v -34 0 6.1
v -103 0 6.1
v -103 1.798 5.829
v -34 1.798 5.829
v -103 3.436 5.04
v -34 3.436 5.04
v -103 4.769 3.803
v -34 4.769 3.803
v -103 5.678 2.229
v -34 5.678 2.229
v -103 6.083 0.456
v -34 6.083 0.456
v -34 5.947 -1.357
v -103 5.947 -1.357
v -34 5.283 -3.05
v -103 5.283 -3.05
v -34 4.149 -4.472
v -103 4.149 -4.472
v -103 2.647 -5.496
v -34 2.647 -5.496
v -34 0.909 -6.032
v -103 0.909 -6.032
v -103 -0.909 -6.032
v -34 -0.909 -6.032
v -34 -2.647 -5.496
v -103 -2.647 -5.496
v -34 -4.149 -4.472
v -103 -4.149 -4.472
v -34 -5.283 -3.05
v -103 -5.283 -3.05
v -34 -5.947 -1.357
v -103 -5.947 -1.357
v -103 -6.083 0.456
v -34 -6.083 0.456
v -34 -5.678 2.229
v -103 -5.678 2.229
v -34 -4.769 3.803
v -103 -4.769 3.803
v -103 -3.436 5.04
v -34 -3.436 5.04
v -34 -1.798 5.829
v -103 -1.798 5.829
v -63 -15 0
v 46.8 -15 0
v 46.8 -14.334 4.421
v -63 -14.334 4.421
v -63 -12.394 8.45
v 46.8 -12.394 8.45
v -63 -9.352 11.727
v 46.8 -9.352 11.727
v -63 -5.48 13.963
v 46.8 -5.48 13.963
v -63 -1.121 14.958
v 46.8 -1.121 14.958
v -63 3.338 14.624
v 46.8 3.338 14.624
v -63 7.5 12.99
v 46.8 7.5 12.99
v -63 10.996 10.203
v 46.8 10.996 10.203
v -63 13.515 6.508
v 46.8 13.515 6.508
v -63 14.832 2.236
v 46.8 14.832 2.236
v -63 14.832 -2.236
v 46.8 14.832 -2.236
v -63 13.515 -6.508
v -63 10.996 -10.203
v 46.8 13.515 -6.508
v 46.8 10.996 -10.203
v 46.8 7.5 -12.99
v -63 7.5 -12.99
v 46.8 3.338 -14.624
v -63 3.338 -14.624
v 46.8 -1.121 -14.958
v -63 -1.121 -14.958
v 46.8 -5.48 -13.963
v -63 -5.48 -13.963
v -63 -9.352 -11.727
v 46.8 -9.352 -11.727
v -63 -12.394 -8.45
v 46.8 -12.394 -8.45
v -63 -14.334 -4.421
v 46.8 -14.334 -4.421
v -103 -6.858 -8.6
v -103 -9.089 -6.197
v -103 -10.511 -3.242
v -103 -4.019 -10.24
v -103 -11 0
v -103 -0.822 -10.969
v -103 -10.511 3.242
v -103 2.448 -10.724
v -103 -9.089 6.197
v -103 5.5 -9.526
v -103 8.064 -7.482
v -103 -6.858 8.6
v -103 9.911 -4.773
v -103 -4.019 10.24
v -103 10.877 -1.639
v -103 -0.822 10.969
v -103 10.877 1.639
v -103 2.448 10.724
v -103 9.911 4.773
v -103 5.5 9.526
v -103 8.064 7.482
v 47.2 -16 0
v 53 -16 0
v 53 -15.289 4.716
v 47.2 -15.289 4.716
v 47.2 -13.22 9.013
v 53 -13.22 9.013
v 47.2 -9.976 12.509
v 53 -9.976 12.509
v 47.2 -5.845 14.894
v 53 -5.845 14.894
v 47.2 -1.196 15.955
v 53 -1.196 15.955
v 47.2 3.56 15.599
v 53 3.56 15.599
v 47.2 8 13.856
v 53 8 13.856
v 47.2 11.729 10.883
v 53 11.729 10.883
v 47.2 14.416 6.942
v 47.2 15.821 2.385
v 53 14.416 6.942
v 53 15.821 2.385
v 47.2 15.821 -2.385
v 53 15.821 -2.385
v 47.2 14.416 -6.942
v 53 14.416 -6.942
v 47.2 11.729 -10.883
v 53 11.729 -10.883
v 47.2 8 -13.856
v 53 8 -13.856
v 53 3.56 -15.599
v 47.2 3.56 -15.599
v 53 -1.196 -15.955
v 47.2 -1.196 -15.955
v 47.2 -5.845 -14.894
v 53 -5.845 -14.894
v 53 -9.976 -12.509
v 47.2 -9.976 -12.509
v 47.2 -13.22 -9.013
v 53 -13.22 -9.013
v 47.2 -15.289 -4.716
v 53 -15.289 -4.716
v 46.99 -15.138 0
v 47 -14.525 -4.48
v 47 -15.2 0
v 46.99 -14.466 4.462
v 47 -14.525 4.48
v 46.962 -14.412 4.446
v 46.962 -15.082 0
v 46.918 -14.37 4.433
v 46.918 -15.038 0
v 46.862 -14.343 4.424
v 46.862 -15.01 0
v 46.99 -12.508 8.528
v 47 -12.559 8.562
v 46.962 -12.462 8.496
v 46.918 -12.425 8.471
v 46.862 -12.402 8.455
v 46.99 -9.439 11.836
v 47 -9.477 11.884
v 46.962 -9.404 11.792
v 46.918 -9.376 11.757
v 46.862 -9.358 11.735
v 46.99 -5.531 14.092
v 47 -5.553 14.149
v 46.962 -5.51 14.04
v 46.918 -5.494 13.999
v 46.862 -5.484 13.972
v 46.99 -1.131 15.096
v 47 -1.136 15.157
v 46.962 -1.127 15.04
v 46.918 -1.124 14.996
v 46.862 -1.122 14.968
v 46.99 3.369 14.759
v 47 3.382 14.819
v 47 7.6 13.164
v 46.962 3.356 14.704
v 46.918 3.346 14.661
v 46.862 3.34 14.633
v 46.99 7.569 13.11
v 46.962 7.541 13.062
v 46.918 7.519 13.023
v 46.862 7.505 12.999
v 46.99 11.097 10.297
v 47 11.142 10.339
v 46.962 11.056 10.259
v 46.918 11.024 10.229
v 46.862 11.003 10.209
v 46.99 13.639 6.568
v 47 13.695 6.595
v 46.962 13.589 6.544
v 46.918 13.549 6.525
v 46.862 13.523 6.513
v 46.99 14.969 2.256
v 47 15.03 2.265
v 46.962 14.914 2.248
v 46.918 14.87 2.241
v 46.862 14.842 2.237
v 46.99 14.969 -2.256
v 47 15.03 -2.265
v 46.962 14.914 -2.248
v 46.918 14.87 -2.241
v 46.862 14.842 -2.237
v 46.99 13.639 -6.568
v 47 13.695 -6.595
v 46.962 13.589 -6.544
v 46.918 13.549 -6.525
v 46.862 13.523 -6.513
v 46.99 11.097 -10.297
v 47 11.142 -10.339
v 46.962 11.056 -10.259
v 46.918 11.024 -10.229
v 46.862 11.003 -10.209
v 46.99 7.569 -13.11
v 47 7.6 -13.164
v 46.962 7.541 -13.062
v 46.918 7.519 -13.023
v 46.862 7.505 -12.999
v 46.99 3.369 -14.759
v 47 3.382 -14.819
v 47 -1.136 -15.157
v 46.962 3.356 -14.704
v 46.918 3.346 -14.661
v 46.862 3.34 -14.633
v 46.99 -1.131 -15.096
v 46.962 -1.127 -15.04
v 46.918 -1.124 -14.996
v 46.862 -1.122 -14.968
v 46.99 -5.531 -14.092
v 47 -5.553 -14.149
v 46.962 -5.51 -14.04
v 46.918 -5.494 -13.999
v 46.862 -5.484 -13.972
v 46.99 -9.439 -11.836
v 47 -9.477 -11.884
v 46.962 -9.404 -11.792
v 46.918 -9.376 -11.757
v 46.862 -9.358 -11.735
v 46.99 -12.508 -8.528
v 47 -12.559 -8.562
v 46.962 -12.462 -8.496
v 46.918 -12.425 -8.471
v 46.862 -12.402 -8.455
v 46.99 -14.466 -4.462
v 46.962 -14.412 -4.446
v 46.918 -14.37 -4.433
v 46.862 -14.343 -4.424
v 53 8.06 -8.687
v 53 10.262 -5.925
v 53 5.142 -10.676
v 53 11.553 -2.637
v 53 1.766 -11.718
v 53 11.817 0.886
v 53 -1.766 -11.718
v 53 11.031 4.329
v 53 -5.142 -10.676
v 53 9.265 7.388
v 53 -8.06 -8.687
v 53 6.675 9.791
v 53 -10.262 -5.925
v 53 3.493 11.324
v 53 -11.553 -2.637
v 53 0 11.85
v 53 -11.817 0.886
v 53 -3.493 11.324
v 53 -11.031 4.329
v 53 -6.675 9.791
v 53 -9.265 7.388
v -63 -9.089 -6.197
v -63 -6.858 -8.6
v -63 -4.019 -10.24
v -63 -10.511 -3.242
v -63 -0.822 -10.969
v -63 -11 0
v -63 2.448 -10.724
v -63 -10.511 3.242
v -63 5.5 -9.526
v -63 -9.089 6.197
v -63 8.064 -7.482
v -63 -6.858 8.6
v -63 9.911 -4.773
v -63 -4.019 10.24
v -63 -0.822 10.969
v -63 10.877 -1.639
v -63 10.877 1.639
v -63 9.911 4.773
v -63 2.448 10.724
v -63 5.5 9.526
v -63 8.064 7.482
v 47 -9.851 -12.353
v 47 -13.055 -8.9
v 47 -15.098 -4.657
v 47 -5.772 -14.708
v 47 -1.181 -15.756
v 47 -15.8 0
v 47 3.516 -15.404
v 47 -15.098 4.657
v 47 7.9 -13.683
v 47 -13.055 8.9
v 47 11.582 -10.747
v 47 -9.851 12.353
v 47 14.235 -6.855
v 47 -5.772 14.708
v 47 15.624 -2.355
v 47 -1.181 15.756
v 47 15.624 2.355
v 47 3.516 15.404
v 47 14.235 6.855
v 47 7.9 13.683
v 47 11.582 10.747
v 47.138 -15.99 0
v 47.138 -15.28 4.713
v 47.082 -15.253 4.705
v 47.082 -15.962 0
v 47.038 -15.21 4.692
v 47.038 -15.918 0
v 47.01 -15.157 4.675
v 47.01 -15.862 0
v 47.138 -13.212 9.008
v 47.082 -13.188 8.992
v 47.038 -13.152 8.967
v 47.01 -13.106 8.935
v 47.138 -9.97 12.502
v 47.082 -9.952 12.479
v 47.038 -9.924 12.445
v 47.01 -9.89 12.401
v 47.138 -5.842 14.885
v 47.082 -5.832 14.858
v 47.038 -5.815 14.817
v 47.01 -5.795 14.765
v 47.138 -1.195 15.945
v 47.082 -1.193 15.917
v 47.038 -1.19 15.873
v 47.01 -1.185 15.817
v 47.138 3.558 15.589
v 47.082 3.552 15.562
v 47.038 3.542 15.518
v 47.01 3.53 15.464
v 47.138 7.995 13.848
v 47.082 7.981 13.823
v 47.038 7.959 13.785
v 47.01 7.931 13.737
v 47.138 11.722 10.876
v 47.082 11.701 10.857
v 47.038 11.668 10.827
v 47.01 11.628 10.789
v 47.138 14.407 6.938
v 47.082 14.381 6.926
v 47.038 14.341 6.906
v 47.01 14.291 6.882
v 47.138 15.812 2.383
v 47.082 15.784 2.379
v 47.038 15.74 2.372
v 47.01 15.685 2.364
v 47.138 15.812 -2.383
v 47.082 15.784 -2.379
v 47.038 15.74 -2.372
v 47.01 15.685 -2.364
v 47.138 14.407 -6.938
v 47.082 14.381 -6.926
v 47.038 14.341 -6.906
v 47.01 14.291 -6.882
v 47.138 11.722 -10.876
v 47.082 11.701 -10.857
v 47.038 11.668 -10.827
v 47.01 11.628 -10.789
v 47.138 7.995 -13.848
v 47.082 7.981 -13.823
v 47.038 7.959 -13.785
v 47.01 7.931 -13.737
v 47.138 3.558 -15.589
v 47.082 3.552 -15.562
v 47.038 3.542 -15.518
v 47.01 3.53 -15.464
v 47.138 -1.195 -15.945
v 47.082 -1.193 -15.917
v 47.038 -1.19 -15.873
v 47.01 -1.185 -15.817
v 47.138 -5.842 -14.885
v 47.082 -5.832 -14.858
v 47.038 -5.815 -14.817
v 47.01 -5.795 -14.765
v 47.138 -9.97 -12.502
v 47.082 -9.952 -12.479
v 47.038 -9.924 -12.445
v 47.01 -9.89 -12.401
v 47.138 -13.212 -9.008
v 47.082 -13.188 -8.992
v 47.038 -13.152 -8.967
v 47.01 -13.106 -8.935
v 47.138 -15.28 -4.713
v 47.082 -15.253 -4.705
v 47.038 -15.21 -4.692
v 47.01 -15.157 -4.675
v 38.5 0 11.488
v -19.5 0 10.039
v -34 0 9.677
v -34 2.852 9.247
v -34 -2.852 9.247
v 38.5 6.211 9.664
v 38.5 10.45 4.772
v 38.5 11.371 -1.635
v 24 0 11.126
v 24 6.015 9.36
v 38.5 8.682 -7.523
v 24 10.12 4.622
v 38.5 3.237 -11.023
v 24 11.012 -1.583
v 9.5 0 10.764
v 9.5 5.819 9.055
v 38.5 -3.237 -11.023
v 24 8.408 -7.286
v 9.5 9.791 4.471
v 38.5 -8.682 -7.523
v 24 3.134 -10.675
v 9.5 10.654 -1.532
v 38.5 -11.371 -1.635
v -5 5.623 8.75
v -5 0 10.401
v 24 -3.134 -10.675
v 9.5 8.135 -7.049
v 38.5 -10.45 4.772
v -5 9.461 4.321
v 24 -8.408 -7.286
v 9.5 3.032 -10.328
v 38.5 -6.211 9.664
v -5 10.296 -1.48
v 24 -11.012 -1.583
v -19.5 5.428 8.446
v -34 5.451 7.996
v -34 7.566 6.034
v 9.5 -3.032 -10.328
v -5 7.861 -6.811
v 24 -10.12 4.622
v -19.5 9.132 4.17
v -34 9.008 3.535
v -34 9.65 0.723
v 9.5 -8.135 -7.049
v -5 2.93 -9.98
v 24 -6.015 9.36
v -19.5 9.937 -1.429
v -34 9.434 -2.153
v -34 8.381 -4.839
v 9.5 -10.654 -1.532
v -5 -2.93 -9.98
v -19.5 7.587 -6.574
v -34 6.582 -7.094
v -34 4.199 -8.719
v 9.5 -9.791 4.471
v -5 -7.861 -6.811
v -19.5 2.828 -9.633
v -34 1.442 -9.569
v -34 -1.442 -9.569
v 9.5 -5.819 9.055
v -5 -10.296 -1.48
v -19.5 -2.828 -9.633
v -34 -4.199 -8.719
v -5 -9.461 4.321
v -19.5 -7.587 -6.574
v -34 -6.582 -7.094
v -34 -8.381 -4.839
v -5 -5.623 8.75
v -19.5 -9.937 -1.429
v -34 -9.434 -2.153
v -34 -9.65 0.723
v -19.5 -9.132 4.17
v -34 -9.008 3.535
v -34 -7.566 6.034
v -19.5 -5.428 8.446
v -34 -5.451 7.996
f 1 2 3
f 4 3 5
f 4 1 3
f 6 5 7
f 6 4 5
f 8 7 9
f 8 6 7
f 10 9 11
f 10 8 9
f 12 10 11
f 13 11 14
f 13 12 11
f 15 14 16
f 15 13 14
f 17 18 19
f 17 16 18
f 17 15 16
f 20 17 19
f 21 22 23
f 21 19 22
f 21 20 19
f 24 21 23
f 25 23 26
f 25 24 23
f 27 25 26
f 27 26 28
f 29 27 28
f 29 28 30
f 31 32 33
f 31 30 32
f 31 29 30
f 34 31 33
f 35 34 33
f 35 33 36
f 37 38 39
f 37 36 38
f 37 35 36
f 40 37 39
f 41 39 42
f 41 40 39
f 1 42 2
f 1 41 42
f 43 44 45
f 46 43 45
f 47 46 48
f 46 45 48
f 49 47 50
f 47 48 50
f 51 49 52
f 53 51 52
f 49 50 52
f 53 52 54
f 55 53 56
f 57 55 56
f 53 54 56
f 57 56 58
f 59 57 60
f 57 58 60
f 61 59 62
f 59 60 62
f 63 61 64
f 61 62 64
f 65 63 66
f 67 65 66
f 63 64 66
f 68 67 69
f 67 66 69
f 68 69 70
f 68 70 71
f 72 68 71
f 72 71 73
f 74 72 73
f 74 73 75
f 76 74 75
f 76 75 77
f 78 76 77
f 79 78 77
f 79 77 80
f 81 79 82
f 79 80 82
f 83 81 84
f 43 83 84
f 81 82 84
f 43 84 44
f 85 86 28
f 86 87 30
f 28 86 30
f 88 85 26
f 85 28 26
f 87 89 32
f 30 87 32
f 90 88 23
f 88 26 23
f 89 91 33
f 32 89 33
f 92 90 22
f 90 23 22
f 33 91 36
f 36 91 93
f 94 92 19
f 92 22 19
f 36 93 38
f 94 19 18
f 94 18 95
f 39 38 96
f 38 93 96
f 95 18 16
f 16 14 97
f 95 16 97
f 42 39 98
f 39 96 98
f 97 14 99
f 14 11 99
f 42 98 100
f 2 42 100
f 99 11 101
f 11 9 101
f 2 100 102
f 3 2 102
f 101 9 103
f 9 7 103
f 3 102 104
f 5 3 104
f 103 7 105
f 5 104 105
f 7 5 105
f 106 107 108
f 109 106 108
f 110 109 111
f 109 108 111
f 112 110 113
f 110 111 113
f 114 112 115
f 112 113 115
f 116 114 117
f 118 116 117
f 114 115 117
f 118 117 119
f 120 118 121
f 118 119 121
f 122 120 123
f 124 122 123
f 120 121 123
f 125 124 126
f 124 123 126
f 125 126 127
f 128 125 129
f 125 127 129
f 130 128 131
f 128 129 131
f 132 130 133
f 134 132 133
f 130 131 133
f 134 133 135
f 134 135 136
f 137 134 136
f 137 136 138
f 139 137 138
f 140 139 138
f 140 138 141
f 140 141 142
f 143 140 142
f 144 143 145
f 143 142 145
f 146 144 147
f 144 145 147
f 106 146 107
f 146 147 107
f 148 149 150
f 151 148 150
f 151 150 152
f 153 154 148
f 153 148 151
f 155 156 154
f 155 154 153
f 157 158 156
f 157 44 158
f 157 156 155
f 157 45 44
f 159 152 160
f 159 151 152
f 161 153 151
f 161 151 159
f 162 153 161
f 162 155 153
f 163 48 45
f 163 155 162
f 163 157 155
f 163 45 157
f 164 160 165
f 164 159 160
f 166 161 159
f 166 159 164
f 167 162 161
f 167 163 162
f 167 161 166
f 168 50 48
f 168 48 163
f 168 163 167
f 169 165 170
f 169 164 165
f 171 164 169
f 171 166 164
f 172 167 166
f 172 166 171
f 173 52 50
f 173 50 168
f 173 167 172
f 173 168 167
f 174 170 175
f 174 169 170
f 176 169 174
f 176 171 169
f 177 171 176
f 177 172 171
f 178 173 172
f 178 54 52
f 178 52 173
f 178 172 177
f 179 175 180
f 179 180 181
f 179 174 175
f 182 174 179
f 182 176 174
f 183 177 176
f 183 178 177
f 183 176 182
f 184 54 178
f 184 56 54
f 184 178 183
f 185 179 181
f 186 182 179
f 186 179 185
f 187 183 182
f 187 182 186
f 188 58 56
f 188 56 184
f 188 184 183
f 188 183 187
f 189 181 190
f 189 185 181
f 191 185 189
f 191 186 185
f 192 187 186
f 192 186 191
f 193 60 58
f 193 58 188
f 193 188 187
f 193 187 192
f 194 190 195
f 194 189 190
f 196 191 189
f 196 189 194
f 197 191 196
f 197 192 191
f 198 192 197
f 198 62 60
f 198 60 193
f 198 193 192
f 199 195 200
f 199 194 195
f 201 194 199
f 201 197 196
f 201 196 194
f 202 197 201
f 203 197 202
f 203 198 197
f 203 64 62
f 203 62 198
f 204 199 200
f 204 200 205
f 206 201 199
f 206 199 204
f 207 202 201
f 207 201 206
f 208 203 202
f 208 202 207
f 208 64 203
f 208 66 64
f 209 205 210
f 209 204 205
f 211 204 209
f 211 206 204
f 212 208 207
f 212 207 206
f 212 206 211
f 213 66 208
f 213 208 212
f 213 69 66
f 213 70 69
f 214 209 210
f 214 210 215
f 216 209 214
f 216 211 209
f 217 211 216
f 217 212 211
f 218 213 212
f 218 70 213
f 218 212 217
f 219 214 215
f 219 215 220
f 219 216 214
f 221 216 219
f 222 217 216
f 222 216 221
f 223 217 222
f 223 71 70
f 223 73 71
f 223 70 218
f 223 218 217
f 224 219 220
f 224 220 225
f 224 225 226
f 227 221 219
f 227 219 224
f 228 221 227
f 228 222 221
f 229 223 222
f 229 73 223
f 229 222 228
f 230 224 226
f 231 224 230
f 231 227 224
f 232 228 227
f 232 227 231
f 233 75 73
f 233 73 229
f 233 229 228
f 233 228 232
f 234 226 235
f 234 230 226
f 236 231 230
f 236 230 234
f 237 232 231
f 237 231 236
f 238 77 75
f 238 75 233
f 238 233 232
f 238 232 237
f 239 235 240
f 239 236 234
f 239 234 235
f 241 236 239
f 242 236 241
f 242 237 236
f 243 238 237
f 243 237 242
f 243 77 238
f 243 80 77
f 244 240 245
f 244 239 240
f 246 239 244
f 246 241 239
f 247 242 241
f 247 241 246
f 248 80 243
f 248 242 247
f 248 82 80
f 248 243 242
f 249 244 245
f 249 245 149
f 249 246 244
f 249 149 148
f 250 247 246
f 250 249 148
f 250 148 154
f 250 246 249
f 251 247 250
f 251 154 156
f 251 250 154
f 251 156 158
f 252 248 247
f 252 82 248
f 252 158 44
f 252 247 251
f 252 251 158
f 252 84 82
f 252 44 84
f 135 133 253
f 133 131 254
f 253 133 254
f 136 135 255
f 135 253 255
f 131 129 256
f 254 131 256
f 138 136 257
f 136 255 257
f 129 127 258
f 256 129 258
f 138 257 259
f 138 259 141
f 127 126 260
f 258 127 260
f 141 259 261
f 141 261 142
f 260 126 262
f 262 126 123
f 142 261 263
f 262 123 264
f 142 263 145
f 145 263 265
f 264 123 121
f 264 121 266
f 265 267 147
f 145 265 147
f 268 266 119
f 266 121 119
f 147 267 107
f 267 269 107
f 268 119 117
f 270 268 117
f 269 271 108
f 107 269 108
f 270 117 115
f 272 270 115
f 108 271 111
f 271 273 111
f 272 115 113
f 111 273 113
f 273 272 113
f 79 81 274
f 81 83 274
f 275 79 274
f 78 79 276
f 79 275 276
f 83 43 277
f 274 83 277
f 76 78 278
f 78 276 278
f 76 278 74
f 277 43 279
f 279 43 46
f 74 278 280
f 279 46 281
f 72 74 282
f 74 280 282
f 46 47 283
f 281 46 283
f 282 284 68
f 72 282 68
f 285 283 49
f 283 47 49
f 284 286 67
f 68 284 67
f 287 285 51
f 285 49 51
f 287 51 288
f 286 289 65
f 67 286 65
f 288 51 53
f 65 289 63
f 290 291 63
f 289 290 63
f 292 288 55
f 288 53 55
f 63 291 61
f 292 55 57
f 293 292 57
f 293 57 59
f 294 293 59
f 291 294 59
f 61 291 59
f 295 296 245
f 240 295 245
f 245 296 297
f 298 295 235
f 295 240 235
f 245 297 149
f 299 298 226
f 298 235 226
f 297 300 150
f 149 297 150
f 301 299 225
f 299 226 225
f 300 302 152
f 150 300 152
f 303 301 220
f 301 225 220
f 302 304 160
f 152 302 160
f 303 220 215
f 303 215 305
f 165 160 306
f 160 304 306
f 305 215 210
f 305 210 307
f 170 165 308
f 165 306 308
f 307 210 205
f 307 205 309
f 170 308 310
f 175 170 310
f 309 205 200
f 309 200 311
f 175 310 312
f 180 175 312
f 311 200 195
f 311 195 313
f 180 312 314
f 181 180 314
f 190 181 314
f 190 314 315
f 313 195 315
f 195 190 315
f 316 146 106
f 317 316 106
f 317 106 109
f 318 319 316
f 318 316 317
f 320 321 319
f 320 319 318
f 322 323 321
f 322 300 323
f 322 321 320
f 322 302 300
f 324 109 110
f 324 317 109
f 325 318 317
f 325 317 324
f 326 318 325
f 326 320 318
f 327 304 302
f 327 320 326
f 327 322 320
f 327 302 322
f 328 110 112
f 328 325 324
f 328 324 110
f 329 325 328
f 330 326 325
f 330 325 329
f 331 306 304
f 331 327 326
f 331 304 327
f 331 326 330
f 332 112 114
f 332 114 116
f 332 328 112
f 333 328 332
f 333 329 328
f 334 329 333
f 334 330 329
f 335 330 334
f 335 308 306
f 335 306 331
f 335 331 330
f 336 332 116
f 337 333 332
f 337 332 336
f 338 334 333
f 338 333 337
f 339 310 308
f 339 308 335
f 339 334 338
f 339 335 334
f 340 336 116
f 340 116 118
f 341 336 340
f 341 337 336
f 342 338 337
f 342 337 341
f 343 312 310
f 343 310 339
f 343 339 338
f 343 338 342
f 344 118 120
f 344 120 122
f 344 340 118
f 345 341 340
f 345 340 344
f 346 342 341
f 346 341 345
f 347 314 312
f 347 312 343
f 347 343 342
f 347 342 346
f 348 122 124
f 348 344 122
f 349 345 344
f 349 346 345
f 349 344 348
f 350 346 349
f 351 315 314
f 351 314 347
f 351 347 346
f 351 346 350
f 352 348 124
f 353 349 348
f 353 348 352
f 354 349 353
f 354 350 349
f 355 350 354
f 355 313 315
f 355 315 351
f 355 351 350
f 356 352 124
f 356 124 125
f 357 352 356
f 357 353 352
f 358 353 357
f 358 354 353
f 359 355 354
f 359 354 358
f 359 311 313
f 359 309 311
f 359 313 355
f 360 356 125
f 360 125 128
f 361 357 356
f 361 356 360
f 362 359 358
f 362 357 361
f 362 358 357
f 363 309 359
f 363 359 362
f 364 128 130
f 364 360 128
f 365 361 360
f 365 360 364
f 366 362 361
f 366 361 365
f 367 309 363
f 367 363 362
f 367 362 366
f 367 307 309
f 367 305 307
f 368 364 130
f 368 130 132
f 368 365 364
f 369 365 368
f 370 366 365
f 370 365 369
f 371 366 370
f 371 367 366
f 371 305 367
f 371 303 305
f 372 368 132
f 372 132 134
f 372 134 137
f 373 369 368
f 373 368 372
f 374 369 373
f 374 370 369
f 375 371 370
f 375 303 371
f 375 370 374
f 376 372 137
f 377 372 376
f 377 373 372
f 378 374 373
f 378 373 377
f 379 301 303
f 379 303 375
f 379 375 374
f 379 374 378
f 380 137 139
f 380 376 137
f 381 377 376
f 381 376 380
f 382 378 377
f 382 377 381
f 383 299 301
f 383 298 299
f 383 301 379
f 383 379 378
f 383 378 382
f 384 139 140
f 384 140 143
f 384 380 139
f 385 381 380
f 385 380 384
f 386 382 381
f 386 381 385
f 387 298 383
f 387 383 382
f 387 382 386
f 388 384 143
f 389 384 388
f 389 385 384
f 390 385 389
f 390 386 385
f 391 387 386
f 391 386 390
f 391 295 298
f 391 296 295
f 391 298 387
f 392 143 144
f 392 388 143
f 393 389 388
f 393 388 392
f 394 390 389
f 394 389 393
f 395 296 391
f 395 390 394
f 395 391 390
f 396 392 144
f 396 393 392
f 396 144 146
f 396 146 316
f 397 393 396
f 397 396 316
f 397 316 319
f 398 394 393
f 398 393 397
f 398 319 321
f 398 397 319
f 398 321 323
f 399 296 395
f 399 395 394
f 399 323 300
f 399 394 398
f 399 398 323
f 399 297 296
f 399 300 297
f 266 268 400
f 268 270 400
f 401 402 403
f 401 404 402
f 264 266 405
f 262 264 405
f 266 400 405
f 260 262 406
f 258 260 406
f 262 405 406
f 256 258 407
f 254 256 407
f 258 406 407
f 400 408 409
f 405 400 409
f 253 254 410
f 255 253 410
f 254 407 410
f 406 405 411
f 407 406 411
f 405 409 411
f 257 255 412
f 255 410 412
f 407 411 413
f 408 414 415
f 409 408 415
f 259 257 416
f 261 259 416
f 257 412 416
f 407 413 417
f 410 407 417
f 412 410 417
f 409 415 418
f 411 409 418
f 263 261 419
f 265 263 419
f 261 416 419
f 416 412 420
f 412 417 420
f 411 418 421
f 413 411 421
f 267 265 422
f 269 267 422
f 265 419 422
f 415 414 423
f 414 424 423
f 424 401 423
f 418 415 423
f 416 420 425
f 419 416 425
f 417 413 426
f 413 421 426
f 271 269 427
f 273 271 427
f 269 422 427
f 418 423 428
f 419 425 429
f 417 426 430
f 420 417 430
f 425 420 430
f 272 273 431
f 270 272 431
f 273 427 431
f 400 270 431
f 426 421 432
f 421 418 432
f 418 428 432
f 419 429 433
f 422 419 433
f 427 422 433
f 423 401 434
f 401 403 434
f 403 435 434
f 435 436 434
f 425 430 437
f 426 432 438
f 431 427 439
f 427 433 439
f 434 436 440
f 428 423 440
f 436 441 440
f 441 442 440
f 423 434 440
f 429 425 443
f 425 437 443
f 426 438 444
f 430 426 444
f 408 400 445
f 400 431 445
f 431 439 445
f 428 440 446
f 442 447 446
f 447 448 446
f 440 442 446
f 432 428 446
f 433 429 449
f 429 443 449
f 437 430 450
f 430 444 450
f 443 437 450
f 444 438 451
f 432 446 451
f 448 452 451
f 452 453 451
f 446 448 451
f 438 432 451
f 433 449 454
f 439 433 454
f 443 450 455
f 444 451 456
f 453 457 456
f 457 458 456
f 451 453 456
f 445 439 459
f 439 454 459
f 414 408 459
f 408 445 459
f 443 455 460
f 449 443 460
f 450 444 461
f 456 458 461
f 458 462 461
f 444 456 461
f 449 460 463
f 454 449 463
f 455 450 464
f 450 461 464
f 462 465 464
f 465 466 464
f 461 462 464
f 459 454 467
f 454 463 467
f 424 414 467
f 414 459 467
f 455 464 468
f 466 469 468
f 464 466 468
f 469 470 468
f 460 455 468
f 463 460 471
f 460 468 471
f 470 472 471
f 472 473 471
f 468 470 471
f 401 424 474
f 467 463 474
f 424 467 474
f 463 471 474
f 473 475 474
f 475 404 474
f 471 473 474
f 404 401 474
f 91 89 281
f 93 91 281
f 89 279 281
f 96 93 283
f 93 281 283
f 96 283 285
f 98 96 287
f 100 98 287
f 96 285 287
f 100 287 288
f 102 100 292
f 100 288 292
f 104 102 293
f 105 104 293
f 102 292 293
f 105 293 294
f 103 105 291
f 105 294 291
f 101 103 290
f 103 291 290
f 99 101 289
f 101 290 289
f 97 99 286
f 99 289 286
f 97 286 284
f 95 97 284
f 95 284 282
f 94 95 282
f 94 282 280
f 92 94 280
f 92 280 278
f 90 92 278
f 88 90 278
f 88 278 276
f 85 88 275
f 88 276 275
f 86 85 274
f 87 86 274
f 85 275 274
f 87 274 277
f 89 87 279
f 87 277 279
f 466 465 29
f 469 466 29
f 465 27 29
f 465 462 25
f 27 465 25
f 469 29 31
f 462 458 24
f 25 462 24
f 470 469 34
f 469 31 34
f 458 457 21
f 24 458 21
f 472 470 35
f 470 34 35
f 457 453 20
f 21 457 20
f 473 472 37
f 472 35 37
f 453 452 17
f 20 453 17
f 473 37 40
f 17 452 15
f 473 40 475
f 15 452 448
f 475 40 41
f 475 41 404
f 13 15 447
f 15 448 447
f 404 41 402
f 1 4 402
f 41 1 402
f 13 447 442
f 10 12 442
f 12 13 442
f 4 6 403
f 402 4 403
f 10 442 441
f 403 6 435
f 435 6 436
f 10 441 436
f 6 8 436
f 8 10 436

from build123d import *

# Parameters (mm, degrees)
F2_W = 100
F2_H = 6.1
F5_R = 0.2


# Not quite as in the source:
# - a feature of the source that left no trace in its solid (it failed there, or was rolled back) is left out


with BuildPart() as f1:
    # F0 (on Top) → F1 (revolve)
    with BuildSketch(Plane.XY):
        Polygon((53, -16), (53, 0), (47, 0), (0, 0), (-103, 0), (-103, -11), (-63, -11), (-63, -15), (47, -15), (47, -16), align=None)
    revolve(axis=Axis((-51.5, 0, 0), (-1, 0, 0)))

    # F2 (on Front) → F3 (revolve, cut)
    with BuildSketch(Plane.XZ):
        Polygon((53, 11.85), (-34, 9.6771213406), (-34, 6.1), (-34, 0), (0, 0), (53, 0), align=None)
        with Locations((-84, 3.05)):
            Rectangle(F2_W, F2_H)
    revolve(axis=Axis((26.5, 0, 0), (-1, 0, 0)), mode=Mode.SUBTRACT)

    # F5
    f5_edges = [f1.edges().sort_by_distance(p)[0] for p in [
        (47, 16, 0),
        (47, 15, 0),
    ]]
    fillet(f5_edges, radius=F5_R)


solid = f1.part
